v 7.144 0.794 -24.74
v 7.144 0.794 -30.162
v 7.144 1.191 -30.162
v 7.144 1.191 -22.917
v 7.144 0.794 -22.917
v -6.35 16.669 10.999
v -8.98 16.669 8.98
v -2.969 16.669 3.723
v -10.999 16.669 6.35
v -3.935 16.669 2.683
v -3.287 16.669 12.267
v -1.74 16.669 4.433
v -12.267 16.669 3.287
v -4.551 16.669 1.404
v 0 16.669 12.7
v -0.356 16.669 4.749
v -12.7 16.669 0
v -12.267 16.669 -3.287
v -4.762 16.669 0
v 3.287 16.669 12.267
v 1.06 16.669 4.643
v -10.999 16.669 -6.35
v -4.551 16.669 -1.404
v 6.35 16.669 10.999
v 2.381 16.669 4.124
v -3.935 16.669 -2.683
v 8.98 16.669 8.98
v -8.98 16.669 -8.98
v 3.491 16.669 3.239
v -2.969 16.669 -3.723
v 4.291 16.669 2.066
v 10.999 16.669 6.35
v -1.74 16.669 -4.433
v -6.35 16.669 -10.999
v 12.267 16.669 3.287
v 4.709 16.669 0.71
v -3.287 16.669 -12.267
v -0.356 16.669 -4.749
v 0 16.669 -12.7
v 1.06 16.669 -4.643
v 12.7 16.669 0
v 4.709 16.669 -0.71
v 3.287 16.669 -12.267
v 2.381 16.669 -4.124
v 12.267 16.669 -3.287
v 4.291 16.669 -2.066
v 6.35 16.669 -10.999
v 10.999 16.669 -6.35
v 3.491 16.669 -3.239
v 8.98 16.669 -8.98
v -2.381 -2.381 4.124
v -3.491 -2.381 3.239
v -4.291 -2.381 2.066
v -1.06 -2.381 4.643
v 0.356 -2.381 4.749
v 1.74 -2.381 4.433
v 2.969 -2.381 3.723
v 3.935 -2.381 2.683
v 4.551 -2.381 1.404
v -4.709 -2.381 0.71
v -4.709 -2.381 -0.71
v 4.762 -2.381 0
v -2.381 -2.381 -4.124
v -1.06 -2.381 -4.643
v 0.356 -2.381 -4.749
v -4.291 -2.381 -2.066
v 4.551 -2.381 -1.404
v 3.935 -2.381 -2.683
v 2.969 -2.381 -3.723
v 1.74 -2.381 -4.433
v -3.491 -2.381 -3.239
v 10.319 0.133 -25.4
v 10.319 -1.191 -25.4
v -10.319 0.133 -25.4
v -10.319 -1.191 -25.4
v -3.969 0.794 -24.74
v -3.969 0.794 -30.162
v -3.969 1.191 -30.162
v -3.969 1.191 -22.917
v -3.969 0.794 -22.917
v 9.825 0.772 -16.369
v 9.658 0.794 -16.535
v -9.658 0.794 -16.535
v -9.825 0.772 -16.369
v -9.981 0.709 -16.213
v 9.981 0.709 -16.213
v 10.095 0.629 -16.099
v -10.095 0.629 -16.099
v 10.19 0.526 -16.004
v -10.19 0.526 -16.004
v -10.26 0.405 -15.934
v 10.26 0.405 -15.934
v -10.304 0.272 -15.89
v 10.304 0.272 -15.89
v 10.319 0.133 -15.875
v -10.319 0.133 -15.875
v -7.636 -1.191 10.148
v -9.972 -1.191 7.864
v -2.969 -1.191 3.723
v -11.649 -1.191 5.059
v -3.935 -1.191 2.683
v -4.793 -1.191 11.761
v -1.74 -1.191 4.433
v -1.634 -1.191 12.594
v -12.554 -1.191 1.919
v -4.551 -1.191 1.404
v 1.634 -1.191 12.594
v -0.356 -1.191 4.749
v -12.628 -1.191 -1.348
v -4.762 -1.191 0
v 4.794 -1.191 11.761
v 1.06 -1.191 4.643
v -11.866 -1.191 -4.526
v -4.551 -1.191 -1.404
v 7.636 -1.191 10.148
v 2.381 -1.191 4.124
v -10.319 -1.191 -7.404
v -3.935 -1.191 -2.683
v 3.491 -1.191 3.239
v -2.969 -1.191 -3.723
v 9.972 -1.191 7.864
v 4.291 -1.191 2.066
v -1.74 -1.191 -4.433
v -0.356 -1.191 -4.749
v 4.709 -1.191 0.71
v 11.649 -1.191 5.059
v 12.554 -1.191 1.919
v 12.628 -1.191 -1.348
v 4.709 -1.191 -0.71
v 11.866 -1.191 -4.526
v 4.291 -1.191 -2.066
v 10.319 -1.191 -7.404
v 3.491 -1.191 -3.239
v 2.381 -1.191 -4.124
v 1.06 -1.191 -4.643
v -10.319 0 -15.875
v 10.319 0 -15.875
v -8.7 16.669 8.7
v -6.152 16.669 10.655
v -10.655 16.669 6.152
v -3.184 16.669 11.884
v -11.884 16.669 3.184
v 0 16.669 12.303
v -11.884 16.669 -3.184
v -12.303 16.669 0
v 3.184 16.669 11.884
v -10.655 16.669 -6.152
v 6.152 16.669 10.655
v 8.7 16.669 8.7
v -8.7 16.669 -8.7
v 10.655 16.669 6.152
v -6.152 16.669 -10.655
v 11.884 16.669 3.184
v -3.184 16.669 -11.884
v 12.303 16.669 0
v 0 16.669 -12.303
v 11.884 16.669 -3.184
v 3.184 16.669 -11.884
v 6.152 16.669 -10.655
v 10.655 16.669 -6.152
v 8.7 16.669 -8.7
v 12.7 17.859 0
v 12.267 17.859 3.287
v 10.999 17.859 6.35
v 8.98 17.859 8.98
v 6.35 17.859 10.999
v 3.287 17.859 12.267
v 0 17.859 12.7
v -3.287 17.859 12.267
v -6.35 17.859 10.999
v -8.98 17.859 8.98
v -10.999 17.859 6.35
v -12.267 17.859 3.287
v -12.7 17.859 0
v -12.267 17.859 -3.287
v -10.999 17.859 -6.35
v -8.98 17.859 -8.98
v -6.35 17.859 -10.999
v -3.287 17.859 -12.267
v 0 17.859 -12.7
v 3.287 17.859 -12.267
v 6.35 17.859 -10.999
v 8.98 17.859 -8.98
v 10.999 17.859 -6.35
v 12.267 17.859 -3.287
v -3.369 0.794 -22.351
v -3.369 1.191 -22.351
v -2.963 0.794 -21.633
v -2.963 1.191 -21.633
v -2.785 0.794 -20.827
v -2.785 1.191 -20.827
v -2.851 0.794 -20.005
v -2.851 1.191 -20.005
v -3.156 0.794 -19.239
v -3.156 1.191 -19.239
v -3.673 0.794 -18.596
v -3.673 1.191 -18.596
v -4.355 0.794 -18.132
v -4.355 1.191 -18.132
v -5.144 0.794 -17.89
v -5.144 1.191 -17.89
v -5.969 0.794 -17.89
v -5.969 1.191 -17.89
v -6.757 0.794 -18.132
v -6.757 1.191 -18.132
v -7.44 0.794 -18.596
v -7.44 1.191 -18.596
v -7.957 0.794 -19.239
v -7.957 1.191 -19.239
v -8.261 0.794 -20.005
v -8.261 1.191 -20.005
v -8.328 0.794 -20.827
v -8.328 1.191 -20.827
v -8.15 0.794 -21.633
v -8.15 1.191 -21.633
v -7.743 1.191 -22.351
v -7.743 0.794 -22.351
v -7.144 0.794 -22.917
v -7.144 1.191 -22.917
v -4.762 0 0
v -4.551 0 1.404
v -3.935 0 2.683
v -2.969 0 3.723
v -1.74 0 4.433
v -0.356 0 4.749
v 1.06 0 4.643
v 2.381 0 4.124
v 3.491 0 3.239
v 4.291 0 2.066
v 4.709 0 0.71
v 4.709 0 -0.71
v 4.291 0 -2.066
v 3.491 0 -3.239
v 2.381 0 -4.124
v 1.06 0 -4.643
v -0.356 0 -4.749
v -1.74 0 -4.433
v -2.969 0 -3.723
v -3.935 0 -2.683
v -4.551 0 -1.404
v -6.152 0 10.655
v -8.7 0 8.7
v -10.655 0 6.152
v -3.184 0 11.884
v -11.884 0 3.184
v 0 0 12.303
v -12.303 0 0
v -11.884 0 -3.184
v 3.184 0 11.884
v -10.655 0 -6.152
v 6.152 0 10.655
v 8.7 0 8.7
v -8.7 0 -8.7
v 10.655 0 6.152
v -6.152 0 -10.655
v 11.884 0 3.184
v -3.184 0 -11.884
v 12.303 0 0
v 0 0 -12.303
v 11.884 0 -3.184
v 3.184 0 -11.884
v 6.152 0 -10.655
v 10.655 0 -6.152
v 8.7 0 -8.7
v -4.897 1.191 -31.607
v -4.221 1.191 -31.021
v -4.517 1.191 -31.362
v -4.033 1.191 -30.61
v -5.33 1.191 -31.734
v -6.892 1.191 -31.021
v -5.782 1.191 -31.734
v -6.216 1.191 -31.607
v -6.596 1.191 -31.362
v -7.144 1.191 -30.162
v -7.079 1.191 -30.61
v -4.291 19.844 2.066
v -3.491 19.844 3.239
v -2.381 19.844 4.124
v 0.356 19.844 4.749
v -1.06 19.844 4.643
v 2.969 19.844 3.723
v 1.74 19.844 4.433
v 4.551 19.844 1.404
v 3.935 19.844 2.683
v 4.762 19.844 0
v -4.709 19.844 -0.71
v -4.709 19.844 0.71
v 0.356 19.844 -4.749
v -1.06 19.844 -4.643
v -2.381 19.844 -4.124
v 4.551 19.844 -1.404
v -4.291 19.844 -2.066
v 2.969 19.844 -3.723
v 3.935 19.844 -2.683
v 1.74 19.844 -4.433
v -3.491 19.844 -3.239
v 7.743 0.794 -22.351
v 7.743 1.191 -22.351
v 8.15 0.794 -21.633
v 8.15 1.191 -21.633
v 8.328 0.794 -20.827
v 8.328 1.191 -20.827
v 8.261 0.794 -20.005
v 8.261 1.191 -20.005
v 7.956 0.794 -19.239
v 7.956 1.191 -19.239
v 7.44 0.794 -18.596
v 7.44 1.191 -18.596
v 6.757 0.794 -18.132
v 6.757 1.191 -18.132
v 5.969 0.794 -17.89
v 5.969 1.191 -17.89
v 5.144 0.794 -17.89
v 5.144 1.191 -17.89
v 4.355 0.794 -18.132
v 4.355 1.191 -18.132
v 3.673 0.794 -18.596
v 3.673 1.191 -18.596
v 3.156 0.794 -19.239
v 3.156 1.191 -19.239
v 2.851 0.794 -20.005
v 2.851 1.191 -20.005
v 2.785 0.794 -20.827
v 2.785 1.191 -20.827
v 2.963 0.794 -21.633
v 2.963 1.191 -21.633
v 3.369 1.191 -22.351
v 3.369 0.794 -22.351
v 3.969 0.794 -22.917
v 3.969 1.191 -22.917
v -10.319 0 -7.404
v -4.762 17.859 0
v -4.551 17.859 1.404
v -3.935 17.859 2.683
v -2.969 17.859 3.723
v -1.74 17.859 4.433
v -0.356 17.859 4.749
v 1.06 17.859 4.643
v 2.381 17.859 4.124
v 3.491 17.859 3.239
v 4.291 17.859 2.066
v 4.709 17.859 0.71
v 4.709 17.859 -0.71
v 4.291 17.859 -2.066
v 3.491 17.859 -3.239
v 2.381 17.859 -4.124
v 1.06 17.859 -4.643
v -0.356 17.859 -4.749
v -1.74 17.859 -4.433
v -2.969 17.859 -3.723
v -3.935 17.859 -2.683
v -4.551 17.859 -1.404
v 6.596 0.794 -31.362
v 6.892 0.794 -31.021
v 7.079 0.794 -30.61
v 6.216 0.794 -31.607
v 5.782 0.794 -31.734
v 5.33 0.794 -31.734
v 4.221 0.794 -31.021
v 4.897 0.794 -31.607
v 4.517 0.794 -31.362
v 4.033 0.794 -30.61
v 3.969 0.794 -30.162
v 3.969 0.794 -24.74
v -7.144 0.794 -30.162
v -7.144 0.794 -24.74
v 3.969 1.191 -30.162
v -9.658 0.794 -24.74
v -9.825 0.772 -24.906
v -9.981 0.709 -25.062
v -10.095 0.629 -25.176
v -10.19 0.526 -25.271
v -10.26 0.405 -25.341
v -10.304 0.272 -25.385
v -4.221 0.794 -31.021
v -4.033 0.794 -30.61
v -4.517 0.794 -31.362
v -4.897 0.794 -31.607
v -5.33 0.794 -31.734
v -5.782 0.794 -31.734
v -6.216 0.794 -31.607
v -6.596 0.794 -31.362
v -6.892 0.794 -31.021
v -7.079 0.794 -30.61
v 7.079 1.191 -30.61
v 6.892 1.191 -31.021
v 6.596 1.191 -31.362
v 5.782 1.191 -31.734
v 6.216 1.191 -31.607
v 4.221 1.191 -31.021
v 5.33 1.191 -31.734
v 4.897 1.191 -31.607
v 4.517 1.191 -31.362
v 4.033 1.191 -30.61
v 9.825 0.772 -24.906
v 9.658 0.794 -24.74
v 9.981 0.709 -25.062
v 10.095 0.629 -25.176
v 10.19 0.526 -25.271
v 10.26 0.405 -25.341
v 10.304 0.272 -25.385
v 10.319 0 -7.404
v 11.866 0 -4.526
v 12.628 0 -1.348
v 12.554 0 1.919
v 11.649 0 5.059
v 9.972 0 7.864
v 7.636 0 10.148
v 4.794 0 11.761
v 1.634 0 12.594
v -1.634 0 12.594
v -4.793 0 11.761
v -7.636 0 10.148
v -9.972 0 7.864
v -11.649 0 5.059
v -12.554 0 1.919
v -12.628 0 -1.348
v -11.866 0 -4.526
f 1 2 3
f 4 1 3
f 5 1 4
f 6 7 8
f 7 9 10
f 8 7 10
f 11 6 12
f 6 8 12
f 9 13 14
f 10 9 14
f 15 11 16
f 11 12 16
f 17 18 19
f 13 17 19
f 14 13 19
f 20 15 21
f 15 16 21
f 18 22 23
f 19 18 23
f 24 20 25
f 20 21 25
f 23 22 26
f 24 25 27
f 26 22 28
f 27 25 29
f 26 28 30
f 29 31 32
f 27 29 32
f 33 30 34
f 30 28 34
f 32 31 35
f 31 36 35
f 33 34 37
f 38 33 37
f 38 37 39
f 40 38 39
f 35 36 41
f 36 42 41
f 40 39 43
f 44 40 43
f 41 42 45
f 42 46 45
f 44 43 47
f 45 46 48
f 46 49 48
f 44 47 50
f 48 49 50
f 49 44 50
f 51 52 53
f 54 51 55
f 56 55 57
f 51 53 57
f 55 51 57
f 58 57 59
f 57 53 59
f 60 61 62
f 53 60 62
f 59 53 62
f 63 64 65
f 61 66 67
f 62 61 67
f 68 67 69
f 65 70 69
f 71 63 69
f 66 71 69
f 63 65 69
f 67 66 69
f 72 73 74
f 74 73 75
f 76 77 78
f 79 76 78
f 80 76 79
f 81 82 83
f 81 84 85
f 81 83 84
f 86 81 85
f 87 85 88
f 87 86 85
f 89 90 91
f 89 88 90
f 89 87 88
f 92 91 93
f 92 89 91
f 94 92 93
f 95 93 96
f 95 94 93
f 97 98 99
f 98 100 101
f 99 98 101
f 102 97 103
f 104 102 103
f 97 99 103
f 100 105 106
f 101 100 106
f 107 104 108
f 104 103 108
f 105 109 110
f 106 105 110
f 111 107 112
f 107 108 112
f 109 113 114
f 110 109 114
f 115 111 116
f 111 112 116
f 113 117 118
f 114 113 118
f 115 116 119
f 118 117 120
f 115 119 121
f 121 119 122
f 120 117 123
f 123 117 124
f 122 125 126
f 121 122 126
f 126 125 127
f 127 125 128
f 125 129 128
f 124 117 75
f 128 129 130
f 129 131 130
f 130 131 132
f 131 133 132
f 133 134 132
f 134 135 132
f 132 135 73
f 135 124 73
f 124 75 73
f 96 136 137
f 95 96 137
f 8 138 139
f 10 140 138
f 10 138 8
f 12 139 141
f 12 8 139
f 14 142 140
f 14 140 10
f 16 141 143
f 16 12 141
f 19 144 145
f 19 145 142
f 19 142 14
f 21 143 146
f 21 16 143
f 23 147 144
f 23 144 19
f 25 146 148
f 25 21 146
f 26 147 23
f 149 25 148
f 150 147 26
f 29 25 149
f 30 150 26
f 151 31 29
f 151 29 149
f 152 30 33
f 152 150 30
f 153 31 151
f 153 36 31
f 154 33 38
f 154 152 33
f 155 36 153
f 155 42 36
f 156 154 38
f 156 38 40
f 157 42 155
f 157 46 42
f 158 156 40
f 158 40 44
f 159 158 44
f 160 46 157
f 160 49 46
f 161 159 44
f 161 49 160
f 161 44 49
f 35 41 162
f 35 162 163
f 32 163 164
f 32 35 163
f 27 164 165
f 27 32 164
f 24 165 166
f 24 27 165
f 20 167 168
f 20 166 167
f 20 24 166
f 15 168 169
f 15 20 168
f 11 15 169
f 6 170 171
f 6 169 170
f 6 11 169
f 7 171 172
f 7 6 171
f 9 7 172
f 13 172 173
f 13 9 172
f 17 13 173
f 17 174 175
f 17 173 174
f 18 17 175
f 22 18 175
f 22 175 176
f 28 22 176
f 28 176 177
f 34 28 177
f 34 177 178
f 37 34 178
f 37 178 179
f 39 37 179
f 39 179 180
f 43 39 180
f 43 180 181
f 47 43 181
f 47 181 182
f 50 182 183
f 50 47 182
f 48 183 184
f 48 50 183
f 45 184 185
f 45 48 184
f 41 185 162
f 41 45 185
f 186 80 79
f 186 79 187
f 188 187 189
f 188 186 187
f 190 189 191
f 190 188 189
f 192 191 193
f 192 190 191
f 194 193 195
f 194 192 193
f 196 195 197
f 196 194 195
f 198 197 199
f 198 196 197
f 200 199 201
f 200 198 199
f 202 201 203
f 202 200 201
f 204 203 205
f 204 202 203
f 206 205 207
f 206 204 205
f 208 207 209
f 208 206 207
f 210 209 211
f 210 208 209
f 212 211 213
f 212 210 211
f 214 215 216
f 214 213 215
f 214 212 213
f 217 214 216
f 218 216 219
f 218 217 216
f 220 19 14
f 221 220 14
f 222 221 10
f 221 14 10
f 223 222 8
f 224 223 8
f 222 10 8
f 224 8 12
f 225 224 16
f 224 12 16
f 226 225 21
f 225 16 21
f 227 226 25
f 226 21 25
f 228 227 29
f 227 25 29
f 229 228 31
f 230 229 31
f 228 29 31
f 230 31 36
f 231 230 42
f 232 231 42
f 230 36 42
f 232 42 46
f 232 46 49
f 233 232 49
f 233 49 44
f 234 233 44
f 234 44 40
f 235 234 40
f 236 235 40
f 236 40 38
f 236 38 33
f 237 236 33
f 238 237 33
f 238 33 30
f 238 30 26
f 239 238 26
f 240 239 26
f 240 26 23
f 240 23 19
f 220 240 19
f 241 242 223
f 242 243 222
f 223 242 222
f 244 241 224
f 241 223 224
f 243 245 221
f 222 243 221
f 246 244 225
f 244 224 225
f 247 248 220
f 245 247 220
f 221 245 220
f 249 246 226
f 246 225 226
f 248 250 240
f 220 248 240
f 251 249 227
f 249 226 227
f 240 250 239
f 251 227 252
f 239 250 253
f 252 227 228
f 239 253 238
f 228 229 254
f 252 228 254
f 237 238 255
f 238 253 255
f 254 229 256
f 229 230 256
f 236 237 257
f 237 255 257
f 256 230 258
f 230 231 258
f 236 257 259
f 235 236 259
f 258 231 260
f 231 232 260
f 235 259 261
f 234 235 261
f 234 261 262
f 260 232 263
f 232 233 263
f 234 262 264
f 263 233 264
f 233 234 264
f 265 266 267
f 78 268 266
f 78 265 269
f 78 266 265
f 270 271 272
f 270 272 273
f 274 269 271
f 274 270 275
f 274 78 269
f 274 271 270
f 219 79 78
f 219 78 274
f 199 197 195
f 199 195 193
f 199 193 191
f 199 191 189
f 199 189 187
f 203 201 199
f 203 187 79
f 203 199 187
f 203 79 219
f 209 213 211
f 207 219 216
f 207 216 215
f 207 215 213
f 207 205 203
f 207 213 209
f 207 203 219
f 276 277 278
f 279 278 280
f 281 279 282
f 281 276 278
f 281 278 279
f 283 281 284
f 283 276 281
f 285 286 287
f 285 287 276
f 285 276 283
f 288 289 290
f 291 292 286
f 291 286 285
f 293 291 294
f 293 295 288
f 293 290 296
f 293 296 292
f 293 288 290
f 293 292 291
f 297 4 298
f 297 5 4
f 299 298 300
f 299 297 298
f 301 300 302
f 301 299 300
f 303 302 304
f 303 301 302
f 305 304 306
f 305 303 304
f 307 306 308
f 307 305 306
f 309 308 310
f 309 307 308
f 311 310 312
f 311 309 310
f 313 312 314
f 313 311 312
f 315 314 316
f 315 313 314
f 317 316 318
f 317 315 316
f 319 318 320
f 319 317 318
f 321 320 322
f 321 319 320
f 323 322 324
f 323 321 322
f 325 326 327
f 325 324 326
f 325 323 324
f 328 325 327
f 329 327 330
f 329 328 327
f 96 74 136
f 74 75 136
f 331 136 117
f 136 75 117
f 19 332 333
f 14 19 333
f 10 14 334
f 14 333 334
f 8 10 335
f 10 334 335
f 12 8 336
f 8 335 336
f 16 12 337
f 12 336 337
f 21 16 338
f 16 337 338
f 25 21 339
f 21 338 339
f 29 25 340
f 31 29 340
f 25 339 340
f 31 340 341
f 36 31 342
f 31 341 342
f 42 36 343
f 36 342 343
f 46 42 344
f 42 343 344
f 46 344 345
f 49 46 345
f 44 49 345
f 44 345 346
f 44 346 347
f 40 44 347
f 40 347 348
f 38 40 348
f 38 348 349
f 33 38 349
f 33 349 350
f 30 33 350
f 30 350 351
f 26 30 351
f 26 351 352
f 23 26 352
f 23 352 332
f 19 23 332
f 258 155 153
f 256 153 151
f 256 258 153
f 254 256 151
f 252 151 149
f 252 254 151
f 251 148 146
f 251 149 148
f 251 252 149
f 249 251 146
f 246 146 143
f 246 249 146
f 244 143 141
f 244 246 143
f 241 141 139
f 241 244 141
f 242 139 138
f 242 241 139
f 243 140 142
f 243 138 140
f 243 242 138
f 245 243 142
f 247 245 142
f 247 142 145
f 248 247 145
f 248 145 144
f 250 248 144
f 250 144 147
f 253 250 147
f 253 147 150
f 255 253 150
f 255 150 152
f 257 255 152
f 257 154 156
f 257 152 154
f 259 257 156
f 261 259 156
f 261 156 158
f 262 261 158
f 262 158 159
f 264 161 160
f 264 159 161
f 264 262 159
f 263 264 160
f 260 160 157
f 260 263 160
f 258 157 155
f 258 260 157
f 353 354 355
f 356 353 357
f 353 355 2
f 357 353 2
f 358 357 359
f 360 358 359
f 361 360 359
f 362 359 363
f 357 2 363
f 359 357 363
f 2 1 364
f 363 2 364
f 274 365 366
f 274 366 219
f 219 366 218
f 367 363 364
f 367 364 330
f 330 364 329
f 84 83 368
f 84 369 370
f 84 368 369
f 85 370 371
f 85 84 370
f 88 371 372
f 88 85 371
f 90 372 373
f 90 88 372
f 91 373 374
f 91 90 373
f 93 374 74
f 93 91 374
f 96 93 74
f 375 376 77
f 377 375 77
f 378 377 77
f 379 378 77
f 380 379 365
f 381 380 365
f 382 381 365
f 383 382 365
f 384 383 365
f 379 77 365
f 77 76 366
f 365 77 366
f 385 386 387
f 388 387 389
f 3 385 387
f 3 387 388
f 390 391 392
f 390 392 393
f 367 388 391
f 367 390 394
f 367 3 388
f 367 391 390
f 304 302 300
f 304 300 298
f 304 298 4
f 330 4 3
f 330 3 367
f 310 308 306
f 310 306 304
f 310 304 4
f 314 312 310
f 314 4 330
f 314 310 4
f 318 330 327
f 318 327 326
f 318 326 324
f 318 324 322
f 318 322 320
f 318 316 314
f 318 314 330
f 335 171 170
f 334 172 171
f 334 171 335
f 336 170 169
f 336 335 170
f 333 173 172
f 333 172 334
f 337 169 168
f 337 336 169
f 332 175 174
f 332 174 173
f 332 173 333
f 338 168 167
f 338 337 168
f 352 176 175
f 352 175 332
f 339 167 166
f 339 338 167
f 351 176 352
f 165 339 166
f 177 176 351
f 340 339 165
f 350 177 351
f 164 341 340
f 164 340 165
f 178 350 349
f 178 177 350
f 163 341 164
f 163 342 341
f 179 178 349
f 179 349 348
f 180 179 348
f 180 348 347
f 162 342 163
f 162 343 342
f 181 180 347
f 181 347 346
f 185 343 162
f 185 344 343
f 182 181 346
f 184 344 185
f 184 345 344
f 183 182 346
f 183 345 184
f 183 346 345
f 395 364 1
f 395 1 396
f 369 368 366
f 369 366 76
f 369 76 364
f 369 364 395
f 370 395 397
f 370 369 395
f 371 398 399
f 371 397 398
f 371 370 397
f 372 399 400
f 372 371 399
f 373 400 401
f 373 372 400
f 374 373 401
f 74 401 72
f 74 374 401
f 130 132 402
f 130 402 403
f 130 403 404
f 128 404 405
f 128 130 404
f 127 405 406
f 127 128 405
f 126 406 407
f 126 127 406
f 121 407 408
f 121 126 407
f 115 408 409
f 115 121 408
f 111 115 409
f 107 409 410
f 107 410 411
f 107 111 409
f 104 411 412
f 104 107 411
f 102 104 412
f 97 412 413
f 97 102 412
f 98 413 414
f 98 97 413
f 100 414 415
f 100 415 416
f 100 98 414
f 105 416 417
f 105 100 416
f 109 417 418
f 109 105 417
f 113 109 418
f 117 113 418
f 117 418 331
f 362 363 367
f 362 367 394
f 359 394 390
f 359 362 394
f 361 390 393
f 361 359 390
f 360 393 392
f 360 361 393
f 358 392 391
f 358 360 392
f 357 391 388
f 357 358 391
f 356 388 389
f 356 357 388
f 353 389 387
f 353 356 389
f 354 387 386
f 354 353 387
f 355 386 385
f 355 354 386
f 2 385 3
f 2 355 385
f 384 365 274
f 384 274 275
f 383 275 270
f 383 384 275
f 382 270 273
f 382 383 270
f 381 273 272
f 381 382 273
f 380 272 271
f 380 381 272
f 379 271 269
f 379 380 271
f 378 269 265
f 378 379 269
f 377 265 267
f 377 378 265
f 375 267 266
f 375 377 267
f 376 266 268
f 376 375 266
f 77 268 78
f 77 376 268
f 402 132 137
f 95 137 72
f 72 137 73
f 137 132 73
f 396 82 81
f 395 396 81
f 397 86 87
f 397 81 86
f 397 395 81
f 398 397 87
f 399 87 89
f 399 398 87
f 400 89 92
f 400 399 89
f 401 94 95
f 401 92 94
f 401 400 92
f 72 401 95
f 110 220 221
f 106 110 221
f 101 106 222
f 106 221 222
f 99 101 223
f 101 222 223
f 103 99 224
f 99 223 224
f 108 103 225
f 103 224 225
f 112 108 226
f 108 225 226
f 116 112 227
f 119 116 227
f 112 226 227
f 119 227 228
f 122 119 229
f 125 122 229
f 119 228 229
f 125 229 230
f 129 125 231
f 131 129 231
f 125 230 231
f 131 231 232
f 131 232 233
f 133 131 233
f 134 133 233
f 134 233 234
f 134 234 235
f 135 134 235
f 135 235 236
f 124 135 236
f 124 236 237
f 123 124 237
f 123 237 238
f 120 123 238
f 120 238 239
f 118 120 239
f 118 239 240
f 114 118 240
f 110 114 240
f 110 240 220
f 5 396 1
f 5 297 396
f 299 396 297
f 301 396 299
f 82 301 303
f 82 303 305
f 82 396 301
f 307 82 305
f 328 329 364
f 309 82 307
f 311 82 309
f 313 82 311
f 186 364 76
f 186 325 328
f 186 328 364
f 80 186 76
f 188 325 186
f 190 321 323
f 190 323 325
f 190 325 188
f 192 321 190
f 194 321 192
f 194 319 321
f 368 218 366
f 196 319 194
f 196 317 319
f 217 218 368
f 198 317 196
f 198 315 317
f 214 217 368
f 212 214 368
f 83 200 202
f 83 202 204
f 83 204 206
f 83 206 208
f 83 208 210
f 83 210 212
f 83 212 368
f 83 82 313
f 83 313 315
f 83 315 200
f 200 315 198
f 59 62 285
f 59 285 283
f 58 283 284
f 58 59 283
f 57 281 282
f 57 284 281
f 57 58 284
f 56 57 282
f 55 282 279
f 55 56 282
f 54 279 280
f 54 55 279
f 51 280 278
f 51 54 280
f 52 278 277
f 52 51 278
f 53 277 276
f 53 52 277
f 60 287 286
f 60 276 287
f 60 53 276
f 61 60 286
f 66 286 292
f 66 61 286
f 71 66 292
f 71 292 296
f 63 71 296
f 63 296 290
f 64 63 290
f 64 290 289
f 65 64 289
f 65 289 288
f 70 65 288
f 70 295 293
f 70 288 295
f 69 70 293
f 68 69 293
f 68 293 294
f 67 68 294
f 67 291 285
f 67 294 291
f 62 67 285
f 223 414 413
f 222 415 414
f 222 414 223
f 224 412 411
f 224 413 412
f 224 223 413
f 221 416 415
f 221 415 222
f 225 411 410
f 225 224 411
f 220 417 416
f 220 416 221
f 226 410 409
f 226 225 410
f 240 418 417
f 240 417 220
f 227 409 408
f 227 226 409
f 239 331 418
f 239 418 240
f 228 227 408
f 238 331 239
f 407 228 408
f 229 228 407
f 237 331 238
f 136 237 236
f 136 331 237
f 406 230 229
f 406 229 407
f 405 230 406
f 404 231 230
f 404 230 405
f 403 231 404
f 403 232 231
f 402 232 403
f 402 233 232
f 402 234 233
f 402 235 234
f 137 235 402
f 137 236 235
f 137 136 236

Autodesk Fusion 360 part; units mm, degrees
sketch "Sketch1" plane through (0, 0, 0) normal (0, 1, 0) x (1, 0, 0) in component "Coil Wiring"
  circle A0 centre (0, 0) radius 12.3031
  dimension "d1" = 24.6062
extrude "Extrude1" add sketch "Sketch1" along normal blind 16.6688 makes body 1 in component "Coil Wiring"
sketch "Sketch1 (2)" plane through (0, 0, 0) normal (0, 1, 0) x (1, 0, 0) in component "Plastic Top"
  circle A0 centre (50.8, -25.4) radius 12.7
  dimension "d4" = 25.4
extrude "Extrude1'" add sketch "Sketch1 (2)" along normal blind 1.1906 separate body makes body 2 in component "Plastic Top"
sketch "Sketch1 (3)" plane through (0, 0, 0) normal (0, 1, 0) x (1, 0, 0) in component "Plastic Bottom"
  circle A0 centre (25.4, -50.8) radius 12.7
  line L0 (25.4, -50.8) -> (25.4, -25.4)
  line L1 (25.4, -25.4) -> (15.0812, -25.4)
  line L2 (25.4, -25.4) -> (35.7187, -25.4)
  line L3 (35.7187, -25.4) -> (35.7187, -43.3964)
  line L4 (15.0812, -25.4) -> (15.0812, -43.3964)
  dimension "d7" = 25.4
  dimension "d8" = 25.4
  dimension "d9" = 10.3188
extrude "Extrude1''" add sketch "Sketch1 (3)" along normal blind 1.1906 separate body makes body 3 in component "Plastic Bottom"
sketch "Sketch2" plane through (0, 1.1906, 0) normal (0, 1, 0) x (-1, 0, 0) in component "Plastic Bottom"
  line L0 (-35.7187, 25.4) -> (-15.0812, 25.4)
  line L1 (-15.0812, 25.4) -> (-15.0812, 43.3964)
  arc A0 (-15.0812, 43.3964) -> (-35.7187, 43.3964) centre (-25.4, 50.8) ccw
  line L2 (-35.7187, 43.3964) -> (-35.7187, 25.4)
  line L3 (-15.0812, 25.4) -> (-15.0812, 34.925)
  line L4 (-15.0812, 34.925) -> (-35.7187, 34.925)
extrude "Extrude2" add sketch "Sketch2" along normal blind 0.7937 contours L0 L1 L2 L3 L4 bodies 3 in component "Plastic Bottom"
fillet "Fillet1" radius 0.6604 4 edges at (35.7187, 1.9844, 30.1625) (25.4, 1.9844, 25.4) (25.4, 1.9844, 34.925) (15.0812, 1.9844, 30.1625) on bodies 3 in component "Plastic Bottom"
sketch "Sketch3" plane through (0, 1.9844, 0) normal (0, 1, 0) x (-1, 0, 0) in component "Plastic Bottom"
  line L0 (-15.7416, 26.0604) -> (-15.7416, 34.2646)
  line L1 (-15.7416, 34.2646) -> (-35.0583, 34.2646)
  line L2 (-35.0583, 34.2646) -> (-35.0583, 26.0604)
  line L3 (-35.0583, 26.0604) -> (-15.7416, 26.0604)
  line L4 (-15.0812, 25.4) -> (-15.0812, 34.925)
  line L5 (-35.7187, 34.925) -> (-35.7187, 25.4)
  circle A0 centre (-19.8437, 30.1625) radius 2.7781
  circle A1 centre (-30.9562, 30.1625) radius 2.7781
  line L6 (-18.2562, 20.6375) -> (-18.2562, 27.8826)
  line L7 (-21.4312, 20.6375) -> (-21.4312, 27.8826)
  line L8 (-29.3687, 20.6375) -> (-29.3687, 27.8826)
  line L9 (-32.5437, 20.6375) -> (-32.5437, 27.8826)
  arc A2 (-21.4312, 20.6375) -> (-18.2562, 20.6375) centre (-19.8437, 20.6375) ccw
  arc A3 (-32.5437, 20.6375) -> (-29.3687, 20.6375) centre (-30.9562, 20.6375) ccw
  dimension "d18" = 5.5563
  dimension "d19" = 5.5563
extrude "Extrude3" add sketch "Sketch3" along normal blind 0.3969 contours L3 L6 L7 A2 | L3 A0 L6 L7 | A0 | L3 L8 L9 A3 | L3 A1 L8 L9 | A1 bodies 3 in component "Plastic Bottom"
sketch "Sketch1 (4)" plane through (0, 0, 0) normal (0, 1, 0) x (1, 0, 0) in component "Core"
  circle A0 centre (25.4, -25.4) radius 4.7625
  dimension "d28" = 9.525
extrude "Extrude1'''" add sketch "Sketch1 (4)" along normal blind 22.225 separate body makes body 4 in component "Core"
sketch "Sketch4" plane through (0, 1.1906, 0) normal (0, 1, 0) x (-1, 0, 0) in component "Plastic Bottom"
  line L0 (-35.7187, 34.925) -> (-15.0812, 34.925)
  line L1 (-15.0812, 34.925) -> (-15.0812, 43.3964)
  arc A0 (-15.0812, 43.3964) -> (-35.7187, 43.3964) centre (-25.4, 50.8) ccw
  line L2 (-35.7187, 43.3964) -> (-35.7187, 34.925)
  circle A1 centre (-25.4, 50.8) radius 4.7625
  dimension "d31" = 9.525
extrude "Extrude4" cut sketch "Sketch4" against normal blind 1.1906 contours A1 bodies 3 in component "Plastic Bottom"
sketch "Sketch2 (2)" plane through (0, 1.1906, 0) normal (0, 1, 0) x (-1, 0, 0) in component "Plastic Top"
  circle A0 centre (-50.8, 25.4) radius 12.7
  circle A1 centre (-50.8, 25.4) radius 4.7625
  dimension "d34" = 9.525
extrude "Extrude2'" cut sketch "Sketch2 (2)" against normal blind 1.1906 contours A1 bodies 2 in component "Plastic Top"
sketch "Sketch2 (3)" plane through (0, 16.6688, 0) normal (0, 1, 0) x (-1, 0, 0) in component "Coil Wiring"
  circle A0 centre (0, 0) radius 12.3031
  circle A1 centre (0, 0) radius 4.7625
  dimension "d37" = 9.525
extrude "Extrude2''" cut sketch "Sketch2 (3)" against normal blind 16.6688 contours A1 bodies 1 in component "Coil Wiring"
component "Coil Wiring" placed x (1, 0, 0) y (0, 1, 0) z (0, 0, 1) at (0, 0, 0)
component "Plastic Top" placed x (1, 0, 0) y (0, 1, 0) z (0, 0, 1) at (-50.8, 16.6688, -25.4)
component "Plastic Bottom" placed x (1, 0, 0) y (0, 1, 0) z (0, 0, 1) at (-25.4, -1.1906, -50.8)
component "Core" placed x (1, 0, 0) y (0, 1, 0) z (0, 0, 1) at (-25.4, -2.3812, -25.4)
equation "d1 = ( 31 / 32 ) * 1 in"
equation "d2 = ( 21 / 32 ) * 1 in"
equation "d5 = ( 3 / 64 ) * 1 in"
equation "d9 = ( 13 / 32 ) * 1 in"
equation "d10 = ( 3 / 64 ) * 1 in"
equation "d13 = ( 1 / 32 ) * 1 in"
equation "d18 = ( 7 / 32 ) * 1 in"
equation "d19 = ( 7 / 32 ) * 1 in"
equation "d26 = ( 1 / 64 ) * 1 in"
equation "d28 = ( 3 / 8 ) * 1 in"
equation "d29 = ( 7 / 8 ) * 1 in"
equation "d31 = ( 3 / 8 ) * 1 in"
equation "d32 = ( -3 / 64 ) * 1 in"
equation "d34 = ( 3 / 8 ) * 1 in"
equation "d35 = ( -3 / 64 ) * 1 in"
equation "d37 = ( 3 / 8 ) * 1 in"
equation "d38 = ( -21 / 32 ) * 1 in"
